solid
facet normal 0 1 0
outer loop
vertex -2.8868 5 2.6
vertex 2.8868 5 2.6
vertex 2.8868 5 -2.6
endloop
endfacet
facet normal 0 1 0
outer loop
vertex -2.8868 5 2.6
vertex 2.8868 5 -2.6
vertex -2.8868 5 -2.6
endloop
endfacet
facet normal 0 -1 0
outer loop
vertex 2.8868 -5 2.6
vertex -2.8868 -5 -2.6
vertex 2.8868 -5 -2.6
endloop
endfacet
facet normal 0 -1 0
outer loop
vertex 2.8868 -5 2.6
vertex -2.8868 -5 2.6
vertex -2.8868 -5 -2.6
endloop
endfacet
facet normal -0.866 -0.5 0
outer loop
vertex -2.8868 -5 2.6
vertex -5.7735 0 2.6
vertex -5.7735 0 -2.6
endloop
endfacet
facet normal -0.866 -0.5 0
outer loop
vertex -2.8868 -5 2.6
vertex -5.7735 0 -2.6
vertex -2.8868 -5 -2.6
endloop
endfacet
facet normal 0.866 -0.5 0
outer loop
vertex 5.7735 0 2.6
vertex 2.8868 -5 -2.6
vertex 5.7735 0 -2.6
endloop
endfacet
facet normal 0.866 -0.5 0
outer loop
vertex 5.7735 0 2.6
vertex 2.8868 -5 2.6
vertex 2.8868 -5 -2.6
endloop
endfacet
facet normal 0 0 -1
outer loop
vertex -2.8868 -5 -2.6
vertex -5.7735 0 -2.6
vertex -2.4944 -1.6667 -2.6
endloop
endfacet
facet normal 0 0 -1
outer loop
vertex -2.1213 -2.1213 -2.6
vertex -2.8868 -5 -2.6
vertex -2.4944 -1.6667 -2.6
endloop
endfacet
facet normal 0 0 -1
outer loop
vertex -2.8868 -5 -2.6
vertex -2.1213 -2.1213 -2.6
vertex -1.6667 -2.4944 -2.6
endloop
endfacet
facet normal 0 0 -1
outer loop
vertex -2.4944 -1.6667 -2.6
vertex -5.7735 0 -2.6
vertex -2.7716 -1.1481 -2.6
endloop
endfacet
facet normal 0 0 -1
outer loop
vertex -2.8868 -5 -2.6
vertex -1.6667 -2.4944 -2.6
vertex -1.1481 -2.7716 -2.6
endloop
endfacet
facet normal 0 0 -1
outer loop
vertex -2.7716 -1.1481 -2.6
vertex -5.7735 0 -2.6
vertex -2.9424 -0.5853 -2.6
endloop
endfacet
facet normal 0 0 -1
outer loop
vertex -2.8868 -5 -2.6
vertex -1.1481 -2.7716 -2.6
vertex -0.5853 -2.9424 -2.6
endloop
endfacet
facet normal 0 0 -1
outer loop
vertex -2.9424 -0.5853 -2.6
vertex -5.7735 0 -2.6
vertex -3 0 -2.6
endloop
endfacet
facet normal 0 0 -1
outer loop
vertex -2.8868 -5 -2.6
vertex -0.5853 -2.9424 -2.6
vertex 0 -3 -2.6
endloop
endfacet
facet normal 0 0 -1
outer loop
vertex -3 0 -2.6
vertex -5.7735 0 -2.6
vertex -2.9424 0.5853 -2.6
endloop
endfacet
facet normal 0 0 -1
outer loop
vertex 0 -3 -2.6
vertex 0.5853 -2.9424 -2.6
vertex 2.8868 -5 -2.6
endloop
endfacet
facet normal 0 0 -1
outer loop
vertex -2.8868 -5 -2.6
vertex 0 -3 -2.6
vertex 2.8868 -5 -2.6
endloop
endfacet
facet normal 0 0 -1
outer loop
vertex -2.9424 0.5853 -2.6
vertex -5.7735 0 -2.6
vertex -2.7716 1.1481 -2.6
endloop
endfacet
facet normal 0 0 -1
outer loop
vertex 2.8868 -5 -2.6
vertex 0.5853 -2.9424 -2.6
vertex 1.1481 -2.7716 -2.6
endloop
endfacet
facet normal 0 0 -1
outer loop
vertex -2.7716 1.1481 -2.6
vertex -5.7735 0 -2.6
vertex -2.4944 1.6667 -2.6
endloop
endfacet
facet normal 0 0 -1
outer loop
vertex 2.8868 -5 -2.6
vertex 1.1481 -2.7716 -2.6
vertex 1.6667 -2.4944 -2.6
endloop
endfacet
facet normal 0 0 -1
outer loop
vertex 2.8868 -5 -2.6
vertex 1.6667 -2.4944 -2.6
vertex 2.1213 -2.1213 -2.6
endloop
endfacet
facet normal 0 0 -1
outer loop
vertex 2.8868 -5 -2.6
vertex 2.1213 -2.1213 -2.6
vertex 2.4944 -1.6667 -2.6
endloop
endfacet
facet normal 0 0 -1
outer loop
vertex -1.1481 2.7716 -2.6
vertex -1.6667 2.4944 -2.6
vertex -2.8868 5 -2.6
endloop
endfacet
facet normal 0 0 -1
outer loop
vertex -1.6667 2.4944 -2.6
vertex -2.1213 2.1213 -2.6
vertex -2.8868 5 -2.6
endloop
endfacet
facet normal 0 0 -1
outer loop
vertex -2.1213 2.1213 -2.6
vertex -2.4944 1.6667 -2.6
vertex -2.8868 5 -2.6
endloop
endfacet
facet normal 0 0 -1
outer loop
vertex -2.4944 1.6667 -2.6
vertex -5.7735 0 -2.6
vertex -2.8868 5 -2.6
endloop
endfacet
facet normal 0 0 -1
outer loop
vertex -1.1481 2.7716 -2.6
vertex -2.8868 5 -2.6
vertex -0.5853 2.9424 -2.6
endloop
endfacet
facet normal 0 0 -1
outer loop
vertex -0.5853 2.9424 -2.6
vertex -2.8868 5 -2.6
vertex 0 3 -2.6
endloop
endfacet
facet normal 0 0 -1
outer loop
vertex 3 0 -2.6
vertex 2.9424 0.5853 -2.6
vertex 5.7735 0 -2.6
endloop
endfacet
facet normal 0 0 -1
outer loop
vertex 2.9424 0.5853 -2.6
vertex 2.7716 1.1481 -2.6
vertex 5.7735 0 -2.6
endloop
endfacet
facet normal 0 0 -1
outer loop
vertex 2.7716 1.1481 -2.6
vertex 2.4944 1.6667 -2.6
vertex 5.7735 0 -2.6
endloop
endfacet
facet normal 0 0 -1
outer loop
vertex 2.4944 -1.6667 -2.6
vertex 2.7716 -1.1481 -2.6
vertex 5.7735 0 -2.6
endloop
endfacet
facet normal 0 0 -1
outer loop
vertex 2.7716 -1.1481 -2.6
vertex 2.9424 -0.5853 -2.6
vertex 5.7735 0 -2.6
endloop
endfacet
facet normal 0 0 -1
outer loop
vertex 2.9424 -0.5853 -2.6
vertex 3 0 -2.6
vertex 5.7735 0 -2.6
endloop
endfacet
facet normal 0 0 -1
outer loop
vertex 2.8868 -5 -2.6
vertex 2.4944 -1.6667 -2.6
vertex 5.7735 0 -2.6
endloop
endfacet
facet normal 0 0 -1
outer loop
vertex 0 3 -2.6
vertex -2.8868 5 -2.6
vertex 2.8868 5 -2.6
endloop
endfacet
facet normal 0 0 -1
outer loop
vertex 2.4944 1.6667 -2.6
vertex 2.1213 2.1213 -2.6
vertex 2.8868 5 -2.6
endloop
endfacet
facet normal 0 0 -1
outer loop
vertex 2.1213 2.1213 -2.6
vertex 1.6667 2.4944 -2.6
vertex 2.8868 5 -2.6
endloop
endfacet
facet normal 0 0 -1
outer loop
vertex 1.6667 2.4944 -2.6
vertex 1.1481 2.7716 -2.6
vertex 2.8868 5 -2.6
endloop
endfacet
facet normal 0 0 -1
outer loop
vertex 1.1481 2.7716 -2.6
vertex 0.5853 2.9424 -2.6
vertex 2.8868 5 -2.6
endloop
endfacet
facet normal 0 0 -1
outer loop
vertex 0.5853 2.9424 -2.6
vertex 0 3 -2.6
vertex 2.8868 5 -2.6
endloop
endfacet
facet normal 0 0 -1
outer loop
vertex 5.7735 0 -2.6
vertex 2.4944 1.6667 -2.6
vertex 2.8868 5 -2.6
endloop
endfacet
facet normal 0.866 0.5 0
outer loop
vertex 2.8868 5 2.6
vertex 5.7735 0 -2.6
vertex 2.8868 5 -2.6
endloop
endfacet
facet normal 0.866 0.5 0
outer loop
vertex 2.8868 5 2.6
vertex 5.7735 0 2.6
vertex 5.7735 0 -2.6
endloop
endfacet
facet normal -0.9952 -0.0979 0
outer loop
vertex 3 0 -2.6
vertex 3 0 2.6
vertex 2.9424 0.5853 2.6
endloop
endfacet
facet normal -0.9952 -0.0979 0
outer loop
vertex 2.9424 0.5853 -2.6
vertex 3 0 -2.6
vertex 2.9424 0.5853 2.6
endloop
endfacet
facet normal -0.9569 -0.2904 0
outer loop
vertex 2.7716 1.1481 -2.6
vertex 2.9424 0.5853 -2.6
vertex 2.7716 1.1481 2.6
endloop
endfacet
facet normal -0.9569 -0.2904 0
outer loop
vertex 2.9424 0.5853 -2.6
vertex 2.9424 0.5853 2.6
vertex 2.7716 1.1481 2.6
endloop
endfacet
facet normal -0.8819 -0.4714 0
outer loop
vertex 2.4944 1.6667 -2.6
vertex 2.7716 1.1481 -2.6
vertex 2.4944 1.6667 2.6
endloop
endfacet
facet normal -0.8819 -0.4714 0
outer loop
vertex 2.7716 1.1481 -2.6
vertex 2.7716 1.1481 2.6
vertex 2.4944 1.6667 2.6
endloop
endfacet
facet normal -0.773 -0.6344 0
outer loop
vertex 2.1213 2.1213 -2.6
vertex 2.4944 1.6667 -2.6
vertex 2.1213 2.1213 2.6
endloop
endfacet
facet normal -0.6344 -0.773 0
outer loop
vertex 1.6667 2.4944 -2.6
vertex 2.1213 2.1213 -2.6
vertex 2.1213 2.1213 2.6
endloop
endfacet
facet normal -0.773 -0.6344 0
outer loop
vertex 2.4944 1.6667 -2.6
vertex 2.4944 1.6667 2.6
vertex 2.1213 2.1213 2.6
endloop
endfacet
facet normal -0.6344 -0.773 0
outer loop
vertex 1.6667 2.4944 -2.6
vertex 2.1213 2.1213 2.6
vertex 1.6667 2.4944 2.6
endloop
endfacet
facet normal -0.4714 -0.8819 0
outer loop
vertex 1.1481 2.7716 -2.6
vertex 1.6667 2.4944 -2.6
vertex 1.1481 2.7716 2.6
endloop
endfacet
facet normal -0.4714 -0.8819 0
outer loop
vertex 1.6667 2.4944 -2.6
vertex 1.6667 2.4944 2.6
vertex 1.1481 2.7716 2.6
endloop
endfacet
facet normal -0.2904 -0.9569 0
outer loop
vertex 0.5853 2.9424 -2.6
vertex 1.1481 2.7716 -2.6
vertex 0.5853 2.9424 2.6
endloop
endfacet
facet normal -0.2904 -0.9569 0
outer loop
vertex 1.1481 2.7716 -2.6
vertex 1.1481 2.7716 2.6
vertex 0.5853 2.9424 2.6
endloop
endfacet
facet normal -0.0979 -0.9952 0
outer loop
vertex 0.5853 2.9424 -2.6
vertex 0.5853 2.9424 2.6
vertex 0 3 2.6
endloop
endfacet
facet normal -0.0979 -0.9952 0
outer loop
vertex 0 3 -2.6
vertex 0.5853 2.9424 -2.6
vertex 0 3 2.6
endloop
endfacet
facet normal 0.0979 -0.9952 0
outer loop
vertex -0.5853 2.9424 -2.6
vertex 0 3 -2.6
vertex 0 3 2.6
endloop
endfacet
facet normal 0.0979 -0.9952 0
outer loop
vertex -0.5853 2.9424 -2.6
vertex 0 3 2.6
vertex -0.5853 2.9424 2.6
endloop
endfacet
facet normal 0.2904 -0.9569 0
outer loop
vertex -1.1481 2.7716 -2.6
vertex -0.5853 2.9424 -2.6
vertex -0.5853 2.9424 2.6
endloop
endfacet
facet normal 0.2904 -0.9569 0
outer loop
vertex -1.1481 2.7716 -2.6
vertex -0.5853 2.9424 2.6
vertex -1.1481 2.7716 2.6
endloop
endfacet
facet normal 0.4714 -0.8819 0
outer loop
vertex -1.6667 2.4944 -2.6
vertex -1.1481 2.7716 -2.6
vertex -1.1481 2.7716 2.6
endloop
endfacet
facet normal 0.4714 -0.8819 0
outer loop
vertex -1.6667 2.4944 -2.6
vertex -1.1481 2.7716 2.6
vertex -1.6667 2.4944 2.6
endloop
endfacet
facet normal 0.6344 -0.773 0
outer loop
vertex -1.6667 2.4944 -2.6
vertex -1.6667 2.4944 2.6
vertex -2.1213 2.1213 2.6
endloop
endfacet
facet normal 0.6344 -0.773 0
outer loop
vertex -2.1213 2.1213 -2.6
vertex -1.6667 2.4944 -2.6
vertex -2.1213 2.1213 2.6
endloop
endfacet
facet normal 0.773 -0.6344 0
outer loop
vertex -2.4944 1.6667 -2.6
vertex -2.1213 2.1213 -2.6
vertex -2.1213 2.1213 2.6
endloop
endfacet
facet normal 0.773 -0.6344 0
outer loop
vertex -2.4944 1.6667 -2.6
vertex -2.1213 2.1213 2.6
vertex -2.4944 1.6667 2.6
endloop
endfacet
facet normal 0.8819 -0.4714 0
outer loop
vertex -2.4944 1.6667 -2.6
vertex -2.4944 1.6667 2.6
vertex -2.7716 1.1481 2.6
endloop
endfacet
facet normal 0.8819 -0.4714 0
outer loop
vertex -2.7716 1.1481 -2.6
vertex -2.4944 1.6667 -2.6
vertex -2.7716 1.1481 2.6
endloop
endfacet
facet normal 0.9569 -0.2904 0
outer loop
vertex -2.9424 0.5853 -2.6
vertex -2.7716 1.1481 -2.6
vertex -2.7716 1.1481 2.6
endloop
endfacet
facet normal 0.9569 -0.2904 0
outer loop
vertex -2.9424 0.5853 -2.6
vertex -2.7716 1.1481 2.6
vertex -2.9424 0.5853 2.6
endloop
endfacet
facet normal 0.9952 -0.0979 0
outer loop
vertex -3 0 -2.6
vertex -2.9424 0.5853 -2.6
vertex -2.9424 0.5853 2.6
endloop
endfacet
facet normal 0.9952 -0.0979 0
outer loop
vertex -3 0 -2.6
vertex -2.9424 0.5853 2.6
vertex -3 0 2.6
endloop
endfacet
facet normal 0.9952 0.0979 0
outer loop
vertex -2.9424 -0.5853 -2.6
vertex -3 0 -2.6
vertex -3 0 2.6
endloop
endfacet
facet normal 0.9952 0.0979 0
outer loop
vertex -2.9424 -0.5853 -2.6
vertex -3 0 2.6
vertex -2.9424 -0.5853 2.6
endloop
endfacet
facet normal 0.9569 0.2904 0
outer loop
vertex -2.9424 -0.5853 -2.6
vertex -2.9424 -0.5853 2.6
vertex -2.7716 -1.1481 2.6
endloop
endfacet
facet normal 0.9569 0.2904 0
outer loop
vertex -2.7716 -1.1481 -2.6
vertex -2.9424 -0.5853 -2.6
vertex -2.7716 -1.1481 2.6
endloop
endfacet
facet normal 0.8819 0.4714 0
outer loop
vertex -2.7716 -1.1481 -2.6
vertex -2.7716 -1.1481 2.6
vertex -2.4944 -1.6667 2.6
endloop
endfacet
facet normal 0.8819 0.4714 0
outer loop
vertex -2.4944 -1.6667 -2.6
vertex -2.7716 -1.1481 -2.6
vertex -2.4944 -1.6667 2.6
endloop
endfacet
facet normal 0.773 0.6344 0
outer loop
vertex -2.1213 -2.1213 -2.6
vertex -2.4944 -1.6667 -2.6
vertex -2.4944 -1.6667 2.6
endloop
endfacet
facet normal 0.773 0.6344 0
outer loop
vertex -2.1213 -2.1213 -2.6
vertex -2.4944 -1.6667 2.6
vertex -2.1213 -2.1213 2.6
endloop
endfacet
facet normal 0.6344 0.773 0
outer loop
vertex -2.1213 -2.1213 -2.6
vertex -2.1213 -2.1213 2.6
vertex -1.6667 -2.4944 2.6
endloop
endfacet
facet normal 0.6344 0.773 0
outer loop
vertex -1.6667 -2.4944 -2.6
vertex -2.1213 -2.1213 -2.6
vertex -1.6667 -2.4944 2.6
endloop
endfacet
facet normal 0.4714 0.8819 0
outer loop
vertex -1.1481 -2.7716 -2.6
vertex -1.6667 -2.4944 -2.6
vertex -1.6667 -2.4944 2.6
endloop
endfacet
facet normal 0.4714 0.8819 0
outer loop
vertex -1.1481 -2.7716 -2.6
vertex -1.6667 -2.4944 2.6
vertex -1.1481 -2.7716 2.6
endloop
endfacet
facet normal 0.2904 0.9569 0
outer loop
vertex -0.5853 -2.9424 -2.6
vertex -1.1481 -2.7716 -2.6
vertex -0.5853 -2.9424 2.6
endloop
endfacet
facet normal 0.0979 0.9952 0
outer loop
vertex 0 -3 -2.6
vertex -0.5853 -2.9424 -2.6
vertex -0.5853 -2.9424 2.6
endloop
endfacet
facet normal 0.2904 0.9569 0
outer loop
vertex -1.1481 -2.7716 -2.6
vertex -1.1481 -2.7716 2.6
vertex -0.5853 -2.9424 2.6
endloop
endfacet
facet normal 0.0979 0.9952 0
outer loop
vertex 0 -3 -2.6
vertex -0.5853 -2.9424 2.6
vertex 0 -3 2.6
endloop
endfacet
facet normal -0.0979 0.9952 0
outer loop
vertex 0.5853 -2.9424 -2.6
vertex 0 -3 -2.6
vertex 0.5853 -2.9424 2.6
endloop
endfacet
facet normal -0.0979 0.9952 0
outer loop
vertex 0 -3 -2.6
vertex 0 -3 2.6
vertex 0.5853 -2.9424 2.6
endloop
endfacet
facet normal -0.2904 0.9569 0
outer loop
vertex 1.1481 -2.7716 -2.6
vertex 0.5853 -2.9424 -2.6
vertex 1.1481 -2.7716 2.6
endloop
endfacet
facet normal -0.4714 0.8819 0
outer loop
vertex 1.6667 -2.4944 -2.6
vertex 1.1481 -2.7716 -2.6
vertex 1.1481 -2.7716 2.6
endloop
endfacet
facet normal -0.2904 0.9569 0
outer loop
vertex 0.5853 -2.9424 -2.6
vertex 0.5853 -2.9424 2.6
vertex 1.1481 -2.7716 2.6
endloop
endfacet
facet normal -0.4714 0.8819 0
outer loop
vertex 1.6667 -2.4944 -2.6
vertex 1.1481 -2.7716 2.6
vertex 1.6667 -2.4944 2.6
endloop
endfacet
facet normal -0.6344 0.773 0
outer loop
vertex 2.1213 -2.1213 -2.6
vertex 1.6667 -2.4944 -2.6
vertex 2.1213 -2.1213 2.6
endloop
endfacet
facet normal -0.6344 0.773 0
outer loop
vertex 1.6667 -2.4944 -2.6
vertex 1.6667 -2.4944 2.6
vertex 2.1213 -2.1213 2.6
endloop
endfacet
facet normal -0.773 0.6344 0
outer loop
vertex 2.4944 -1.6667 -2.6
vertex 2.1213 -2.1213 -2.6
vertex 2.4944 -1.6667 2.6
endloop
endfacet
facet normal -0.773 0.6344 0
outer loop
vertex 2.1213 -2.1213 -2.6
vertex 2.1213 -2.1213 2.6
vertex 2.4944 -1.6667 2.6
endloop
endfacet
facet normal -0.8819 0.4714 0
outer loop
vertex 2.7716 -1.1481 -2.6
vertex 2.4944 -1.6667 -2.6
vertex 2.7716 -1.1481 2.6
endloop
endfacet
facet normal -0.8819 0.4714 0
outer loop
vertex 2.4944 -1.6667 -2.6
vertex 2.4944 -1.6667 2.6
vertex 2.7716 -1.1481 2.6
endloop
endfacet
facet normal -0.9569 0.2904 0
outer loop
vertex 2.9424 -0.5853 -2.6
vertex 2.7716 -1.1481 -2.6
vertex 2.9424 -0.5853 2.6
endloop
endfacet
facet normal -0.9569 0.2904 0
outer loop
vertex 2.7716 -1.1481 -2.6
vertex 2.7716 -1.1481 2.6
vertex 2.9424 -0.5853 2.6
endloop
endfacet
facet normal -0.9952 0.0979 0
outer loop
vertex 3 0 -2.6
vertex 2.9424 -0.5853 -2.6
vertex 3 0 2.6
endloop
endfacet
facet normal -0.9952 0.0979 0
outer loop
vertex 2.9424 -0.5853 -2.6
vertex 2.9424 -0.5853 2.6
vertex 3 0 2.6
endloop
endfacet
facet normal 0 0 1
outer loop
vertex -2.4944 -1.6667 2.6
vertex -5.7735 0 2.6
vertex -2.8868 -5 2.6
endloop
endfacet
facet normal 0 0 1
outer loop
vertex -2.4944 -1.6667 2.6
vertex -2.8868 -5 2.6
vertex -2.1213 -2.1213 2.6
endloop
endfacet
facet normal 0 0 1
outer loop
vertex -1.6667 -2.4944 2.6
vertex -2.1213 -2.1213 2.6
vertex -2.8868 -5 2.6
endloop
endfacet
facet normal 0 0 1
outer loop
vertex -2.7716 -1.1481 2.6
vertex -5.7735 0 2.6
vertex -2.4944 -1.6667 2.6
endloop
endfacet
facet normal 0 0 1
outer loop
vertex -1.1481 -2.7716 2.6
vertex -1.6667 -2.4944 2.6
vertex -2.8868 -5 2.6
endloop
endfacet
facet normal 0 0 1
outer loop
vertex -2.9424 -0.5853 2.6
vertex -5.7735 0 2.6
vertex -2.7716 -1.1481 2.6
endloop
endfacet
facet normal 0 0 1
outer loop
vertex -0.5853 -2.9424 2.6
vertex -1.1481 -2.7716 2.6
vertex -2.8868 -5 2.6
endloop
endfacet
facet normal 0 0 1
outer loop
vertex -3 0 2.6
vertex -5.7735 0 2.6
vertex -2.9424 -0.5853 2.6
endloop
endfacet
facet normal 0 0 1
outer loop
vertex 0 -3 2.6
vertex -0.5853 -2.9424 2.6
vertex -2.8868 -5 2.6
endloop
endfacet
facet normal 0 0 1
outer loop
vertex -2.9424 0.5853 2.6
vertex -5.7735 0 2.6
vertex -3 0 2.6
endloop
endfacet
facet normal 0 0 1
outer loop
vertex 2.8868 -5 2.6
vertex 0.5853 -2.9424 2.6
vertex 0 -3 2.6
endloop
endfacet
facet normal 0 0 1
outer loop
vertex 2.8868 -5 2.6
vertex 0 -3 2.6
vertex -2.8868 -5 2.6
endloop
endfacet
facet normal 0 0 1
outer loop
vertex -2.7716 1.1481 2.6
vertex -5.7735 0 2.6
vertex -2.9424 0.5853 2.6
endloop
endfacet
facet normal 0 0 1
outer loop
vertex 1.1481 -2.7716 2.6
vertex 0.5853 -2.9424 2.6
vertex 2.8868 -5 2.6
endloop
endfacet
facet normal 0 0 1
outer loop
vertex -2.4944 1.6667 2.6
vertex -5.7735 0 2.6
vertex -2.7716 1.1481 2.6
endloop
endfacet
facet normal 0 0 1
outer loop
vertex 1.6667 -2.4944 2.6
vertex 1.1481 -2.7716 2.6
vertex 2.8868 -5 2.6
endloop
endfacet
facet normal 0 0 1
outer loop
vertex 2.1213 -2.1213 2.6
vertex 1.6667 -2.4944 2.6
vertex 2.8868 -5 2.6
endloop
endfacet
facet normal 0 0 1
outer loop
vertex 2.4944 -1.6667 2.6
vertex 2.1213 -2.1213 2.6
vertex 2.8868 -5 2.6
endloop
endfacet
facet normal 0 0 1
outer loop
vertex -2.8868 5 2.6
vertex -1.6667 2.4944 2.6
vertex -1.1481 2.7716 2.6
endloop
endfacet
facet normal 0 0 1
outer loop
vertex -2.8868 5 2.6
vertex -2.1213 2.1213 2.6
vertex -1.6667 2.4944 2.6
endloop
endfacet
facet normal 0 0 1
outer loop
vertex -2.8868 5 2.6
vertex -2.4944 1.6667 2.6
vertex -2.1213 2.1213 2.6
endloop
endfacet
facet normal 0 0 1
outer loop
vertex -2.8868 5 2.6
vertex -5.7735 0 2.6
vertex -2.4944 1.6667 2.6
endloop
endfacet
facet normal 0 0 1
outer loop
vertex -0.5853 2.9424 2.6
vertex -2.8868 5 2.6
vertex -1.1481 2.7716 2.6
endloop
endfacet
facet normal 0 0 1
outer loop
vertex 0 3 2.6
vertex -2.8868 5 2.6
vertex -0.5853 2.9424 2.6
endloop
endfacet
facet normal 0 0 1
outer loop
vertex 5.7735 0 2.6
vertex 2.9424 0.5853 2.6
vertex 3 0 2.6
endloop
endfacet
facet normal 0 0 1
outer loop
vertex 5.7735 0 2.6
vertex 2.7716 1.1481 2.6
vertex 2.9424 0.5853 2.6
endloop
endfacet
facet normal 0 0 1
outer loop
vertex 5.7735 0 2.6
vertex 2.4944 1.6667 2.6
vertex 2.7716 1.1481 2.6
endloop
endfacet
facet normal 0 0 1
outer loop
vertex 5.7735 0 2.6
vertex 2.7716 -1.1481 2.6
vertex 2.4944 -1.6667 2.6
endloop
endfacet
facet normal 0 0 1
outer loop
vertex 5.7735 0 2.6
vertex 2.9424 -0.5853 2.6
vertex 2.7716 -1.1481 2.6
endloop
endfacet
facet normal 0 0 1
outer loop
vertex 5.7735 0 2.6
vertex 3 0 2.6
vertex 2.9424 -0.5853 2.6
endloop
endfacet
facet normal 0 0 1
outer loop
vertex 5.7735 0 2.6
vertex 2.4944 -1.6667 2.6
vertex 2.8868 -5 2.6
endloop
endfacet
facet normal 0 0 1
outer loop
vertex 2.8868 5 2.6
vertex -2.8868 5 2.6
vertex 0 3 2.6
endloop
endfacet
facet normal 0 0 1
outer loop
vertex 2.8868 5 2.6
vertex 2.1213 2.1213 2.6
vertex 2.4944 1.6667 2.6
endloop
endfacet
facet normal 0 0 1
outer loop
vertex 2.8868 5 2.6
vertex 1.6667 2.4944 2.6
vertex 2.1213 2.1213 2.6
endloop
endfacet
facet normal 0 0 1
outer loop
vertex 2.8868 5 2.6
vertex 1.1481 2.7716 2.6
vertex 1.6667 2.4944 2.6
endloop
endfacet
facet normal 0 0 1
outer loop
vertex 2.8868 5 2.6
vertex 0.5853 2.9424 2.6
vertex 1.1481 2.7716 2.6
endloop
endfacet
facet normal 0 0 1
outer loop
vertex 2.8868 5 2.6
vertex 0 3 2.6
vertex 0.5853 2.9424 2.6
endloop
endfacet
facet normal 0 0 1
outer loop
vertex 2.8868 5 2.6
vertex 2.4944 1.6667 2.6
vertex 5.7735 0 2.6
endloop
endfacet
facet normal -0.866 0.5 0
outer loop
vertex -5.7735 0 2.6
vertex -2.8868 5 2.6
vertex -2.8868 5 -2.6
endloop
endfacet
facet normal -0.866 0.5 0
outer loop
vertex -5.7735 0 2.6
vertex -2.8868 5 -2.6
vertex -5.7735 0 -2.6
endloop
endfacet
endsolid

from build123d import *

# Parameters (mm, degrees)
BOSS_EXTRUDE1_DEPTH = 2.6
SKETCH2_R           = 3
CUT_EXTRUDE1_DEPTH  = 6.2


with BuildPart() as part:
    # Sketch1 → Boss-Extrude1 (new body, symmetric)
    with BuildSketch(Plane.XY):
        Polygon((5.773502692, 0), (2.886751346, 5), (-2.886751346, 5), (-5.773502692, 0), (-2.886751346, -5), (2.886751346, -5), align=None)
    extrude(amount=BOSS_EXTRUDE1_DEPTH, both=True)

    # Sketch2 → Cut-Extrude1 (cut, through all)
    with BuildSketch(Plane.XY.offset(2.6)):
        Circle(SKETCH2_R)
    extrude(amount=-CUT_EXTRUDE1_DEPTH, mode=Mode.SUBTRACT)


solid = part.part
